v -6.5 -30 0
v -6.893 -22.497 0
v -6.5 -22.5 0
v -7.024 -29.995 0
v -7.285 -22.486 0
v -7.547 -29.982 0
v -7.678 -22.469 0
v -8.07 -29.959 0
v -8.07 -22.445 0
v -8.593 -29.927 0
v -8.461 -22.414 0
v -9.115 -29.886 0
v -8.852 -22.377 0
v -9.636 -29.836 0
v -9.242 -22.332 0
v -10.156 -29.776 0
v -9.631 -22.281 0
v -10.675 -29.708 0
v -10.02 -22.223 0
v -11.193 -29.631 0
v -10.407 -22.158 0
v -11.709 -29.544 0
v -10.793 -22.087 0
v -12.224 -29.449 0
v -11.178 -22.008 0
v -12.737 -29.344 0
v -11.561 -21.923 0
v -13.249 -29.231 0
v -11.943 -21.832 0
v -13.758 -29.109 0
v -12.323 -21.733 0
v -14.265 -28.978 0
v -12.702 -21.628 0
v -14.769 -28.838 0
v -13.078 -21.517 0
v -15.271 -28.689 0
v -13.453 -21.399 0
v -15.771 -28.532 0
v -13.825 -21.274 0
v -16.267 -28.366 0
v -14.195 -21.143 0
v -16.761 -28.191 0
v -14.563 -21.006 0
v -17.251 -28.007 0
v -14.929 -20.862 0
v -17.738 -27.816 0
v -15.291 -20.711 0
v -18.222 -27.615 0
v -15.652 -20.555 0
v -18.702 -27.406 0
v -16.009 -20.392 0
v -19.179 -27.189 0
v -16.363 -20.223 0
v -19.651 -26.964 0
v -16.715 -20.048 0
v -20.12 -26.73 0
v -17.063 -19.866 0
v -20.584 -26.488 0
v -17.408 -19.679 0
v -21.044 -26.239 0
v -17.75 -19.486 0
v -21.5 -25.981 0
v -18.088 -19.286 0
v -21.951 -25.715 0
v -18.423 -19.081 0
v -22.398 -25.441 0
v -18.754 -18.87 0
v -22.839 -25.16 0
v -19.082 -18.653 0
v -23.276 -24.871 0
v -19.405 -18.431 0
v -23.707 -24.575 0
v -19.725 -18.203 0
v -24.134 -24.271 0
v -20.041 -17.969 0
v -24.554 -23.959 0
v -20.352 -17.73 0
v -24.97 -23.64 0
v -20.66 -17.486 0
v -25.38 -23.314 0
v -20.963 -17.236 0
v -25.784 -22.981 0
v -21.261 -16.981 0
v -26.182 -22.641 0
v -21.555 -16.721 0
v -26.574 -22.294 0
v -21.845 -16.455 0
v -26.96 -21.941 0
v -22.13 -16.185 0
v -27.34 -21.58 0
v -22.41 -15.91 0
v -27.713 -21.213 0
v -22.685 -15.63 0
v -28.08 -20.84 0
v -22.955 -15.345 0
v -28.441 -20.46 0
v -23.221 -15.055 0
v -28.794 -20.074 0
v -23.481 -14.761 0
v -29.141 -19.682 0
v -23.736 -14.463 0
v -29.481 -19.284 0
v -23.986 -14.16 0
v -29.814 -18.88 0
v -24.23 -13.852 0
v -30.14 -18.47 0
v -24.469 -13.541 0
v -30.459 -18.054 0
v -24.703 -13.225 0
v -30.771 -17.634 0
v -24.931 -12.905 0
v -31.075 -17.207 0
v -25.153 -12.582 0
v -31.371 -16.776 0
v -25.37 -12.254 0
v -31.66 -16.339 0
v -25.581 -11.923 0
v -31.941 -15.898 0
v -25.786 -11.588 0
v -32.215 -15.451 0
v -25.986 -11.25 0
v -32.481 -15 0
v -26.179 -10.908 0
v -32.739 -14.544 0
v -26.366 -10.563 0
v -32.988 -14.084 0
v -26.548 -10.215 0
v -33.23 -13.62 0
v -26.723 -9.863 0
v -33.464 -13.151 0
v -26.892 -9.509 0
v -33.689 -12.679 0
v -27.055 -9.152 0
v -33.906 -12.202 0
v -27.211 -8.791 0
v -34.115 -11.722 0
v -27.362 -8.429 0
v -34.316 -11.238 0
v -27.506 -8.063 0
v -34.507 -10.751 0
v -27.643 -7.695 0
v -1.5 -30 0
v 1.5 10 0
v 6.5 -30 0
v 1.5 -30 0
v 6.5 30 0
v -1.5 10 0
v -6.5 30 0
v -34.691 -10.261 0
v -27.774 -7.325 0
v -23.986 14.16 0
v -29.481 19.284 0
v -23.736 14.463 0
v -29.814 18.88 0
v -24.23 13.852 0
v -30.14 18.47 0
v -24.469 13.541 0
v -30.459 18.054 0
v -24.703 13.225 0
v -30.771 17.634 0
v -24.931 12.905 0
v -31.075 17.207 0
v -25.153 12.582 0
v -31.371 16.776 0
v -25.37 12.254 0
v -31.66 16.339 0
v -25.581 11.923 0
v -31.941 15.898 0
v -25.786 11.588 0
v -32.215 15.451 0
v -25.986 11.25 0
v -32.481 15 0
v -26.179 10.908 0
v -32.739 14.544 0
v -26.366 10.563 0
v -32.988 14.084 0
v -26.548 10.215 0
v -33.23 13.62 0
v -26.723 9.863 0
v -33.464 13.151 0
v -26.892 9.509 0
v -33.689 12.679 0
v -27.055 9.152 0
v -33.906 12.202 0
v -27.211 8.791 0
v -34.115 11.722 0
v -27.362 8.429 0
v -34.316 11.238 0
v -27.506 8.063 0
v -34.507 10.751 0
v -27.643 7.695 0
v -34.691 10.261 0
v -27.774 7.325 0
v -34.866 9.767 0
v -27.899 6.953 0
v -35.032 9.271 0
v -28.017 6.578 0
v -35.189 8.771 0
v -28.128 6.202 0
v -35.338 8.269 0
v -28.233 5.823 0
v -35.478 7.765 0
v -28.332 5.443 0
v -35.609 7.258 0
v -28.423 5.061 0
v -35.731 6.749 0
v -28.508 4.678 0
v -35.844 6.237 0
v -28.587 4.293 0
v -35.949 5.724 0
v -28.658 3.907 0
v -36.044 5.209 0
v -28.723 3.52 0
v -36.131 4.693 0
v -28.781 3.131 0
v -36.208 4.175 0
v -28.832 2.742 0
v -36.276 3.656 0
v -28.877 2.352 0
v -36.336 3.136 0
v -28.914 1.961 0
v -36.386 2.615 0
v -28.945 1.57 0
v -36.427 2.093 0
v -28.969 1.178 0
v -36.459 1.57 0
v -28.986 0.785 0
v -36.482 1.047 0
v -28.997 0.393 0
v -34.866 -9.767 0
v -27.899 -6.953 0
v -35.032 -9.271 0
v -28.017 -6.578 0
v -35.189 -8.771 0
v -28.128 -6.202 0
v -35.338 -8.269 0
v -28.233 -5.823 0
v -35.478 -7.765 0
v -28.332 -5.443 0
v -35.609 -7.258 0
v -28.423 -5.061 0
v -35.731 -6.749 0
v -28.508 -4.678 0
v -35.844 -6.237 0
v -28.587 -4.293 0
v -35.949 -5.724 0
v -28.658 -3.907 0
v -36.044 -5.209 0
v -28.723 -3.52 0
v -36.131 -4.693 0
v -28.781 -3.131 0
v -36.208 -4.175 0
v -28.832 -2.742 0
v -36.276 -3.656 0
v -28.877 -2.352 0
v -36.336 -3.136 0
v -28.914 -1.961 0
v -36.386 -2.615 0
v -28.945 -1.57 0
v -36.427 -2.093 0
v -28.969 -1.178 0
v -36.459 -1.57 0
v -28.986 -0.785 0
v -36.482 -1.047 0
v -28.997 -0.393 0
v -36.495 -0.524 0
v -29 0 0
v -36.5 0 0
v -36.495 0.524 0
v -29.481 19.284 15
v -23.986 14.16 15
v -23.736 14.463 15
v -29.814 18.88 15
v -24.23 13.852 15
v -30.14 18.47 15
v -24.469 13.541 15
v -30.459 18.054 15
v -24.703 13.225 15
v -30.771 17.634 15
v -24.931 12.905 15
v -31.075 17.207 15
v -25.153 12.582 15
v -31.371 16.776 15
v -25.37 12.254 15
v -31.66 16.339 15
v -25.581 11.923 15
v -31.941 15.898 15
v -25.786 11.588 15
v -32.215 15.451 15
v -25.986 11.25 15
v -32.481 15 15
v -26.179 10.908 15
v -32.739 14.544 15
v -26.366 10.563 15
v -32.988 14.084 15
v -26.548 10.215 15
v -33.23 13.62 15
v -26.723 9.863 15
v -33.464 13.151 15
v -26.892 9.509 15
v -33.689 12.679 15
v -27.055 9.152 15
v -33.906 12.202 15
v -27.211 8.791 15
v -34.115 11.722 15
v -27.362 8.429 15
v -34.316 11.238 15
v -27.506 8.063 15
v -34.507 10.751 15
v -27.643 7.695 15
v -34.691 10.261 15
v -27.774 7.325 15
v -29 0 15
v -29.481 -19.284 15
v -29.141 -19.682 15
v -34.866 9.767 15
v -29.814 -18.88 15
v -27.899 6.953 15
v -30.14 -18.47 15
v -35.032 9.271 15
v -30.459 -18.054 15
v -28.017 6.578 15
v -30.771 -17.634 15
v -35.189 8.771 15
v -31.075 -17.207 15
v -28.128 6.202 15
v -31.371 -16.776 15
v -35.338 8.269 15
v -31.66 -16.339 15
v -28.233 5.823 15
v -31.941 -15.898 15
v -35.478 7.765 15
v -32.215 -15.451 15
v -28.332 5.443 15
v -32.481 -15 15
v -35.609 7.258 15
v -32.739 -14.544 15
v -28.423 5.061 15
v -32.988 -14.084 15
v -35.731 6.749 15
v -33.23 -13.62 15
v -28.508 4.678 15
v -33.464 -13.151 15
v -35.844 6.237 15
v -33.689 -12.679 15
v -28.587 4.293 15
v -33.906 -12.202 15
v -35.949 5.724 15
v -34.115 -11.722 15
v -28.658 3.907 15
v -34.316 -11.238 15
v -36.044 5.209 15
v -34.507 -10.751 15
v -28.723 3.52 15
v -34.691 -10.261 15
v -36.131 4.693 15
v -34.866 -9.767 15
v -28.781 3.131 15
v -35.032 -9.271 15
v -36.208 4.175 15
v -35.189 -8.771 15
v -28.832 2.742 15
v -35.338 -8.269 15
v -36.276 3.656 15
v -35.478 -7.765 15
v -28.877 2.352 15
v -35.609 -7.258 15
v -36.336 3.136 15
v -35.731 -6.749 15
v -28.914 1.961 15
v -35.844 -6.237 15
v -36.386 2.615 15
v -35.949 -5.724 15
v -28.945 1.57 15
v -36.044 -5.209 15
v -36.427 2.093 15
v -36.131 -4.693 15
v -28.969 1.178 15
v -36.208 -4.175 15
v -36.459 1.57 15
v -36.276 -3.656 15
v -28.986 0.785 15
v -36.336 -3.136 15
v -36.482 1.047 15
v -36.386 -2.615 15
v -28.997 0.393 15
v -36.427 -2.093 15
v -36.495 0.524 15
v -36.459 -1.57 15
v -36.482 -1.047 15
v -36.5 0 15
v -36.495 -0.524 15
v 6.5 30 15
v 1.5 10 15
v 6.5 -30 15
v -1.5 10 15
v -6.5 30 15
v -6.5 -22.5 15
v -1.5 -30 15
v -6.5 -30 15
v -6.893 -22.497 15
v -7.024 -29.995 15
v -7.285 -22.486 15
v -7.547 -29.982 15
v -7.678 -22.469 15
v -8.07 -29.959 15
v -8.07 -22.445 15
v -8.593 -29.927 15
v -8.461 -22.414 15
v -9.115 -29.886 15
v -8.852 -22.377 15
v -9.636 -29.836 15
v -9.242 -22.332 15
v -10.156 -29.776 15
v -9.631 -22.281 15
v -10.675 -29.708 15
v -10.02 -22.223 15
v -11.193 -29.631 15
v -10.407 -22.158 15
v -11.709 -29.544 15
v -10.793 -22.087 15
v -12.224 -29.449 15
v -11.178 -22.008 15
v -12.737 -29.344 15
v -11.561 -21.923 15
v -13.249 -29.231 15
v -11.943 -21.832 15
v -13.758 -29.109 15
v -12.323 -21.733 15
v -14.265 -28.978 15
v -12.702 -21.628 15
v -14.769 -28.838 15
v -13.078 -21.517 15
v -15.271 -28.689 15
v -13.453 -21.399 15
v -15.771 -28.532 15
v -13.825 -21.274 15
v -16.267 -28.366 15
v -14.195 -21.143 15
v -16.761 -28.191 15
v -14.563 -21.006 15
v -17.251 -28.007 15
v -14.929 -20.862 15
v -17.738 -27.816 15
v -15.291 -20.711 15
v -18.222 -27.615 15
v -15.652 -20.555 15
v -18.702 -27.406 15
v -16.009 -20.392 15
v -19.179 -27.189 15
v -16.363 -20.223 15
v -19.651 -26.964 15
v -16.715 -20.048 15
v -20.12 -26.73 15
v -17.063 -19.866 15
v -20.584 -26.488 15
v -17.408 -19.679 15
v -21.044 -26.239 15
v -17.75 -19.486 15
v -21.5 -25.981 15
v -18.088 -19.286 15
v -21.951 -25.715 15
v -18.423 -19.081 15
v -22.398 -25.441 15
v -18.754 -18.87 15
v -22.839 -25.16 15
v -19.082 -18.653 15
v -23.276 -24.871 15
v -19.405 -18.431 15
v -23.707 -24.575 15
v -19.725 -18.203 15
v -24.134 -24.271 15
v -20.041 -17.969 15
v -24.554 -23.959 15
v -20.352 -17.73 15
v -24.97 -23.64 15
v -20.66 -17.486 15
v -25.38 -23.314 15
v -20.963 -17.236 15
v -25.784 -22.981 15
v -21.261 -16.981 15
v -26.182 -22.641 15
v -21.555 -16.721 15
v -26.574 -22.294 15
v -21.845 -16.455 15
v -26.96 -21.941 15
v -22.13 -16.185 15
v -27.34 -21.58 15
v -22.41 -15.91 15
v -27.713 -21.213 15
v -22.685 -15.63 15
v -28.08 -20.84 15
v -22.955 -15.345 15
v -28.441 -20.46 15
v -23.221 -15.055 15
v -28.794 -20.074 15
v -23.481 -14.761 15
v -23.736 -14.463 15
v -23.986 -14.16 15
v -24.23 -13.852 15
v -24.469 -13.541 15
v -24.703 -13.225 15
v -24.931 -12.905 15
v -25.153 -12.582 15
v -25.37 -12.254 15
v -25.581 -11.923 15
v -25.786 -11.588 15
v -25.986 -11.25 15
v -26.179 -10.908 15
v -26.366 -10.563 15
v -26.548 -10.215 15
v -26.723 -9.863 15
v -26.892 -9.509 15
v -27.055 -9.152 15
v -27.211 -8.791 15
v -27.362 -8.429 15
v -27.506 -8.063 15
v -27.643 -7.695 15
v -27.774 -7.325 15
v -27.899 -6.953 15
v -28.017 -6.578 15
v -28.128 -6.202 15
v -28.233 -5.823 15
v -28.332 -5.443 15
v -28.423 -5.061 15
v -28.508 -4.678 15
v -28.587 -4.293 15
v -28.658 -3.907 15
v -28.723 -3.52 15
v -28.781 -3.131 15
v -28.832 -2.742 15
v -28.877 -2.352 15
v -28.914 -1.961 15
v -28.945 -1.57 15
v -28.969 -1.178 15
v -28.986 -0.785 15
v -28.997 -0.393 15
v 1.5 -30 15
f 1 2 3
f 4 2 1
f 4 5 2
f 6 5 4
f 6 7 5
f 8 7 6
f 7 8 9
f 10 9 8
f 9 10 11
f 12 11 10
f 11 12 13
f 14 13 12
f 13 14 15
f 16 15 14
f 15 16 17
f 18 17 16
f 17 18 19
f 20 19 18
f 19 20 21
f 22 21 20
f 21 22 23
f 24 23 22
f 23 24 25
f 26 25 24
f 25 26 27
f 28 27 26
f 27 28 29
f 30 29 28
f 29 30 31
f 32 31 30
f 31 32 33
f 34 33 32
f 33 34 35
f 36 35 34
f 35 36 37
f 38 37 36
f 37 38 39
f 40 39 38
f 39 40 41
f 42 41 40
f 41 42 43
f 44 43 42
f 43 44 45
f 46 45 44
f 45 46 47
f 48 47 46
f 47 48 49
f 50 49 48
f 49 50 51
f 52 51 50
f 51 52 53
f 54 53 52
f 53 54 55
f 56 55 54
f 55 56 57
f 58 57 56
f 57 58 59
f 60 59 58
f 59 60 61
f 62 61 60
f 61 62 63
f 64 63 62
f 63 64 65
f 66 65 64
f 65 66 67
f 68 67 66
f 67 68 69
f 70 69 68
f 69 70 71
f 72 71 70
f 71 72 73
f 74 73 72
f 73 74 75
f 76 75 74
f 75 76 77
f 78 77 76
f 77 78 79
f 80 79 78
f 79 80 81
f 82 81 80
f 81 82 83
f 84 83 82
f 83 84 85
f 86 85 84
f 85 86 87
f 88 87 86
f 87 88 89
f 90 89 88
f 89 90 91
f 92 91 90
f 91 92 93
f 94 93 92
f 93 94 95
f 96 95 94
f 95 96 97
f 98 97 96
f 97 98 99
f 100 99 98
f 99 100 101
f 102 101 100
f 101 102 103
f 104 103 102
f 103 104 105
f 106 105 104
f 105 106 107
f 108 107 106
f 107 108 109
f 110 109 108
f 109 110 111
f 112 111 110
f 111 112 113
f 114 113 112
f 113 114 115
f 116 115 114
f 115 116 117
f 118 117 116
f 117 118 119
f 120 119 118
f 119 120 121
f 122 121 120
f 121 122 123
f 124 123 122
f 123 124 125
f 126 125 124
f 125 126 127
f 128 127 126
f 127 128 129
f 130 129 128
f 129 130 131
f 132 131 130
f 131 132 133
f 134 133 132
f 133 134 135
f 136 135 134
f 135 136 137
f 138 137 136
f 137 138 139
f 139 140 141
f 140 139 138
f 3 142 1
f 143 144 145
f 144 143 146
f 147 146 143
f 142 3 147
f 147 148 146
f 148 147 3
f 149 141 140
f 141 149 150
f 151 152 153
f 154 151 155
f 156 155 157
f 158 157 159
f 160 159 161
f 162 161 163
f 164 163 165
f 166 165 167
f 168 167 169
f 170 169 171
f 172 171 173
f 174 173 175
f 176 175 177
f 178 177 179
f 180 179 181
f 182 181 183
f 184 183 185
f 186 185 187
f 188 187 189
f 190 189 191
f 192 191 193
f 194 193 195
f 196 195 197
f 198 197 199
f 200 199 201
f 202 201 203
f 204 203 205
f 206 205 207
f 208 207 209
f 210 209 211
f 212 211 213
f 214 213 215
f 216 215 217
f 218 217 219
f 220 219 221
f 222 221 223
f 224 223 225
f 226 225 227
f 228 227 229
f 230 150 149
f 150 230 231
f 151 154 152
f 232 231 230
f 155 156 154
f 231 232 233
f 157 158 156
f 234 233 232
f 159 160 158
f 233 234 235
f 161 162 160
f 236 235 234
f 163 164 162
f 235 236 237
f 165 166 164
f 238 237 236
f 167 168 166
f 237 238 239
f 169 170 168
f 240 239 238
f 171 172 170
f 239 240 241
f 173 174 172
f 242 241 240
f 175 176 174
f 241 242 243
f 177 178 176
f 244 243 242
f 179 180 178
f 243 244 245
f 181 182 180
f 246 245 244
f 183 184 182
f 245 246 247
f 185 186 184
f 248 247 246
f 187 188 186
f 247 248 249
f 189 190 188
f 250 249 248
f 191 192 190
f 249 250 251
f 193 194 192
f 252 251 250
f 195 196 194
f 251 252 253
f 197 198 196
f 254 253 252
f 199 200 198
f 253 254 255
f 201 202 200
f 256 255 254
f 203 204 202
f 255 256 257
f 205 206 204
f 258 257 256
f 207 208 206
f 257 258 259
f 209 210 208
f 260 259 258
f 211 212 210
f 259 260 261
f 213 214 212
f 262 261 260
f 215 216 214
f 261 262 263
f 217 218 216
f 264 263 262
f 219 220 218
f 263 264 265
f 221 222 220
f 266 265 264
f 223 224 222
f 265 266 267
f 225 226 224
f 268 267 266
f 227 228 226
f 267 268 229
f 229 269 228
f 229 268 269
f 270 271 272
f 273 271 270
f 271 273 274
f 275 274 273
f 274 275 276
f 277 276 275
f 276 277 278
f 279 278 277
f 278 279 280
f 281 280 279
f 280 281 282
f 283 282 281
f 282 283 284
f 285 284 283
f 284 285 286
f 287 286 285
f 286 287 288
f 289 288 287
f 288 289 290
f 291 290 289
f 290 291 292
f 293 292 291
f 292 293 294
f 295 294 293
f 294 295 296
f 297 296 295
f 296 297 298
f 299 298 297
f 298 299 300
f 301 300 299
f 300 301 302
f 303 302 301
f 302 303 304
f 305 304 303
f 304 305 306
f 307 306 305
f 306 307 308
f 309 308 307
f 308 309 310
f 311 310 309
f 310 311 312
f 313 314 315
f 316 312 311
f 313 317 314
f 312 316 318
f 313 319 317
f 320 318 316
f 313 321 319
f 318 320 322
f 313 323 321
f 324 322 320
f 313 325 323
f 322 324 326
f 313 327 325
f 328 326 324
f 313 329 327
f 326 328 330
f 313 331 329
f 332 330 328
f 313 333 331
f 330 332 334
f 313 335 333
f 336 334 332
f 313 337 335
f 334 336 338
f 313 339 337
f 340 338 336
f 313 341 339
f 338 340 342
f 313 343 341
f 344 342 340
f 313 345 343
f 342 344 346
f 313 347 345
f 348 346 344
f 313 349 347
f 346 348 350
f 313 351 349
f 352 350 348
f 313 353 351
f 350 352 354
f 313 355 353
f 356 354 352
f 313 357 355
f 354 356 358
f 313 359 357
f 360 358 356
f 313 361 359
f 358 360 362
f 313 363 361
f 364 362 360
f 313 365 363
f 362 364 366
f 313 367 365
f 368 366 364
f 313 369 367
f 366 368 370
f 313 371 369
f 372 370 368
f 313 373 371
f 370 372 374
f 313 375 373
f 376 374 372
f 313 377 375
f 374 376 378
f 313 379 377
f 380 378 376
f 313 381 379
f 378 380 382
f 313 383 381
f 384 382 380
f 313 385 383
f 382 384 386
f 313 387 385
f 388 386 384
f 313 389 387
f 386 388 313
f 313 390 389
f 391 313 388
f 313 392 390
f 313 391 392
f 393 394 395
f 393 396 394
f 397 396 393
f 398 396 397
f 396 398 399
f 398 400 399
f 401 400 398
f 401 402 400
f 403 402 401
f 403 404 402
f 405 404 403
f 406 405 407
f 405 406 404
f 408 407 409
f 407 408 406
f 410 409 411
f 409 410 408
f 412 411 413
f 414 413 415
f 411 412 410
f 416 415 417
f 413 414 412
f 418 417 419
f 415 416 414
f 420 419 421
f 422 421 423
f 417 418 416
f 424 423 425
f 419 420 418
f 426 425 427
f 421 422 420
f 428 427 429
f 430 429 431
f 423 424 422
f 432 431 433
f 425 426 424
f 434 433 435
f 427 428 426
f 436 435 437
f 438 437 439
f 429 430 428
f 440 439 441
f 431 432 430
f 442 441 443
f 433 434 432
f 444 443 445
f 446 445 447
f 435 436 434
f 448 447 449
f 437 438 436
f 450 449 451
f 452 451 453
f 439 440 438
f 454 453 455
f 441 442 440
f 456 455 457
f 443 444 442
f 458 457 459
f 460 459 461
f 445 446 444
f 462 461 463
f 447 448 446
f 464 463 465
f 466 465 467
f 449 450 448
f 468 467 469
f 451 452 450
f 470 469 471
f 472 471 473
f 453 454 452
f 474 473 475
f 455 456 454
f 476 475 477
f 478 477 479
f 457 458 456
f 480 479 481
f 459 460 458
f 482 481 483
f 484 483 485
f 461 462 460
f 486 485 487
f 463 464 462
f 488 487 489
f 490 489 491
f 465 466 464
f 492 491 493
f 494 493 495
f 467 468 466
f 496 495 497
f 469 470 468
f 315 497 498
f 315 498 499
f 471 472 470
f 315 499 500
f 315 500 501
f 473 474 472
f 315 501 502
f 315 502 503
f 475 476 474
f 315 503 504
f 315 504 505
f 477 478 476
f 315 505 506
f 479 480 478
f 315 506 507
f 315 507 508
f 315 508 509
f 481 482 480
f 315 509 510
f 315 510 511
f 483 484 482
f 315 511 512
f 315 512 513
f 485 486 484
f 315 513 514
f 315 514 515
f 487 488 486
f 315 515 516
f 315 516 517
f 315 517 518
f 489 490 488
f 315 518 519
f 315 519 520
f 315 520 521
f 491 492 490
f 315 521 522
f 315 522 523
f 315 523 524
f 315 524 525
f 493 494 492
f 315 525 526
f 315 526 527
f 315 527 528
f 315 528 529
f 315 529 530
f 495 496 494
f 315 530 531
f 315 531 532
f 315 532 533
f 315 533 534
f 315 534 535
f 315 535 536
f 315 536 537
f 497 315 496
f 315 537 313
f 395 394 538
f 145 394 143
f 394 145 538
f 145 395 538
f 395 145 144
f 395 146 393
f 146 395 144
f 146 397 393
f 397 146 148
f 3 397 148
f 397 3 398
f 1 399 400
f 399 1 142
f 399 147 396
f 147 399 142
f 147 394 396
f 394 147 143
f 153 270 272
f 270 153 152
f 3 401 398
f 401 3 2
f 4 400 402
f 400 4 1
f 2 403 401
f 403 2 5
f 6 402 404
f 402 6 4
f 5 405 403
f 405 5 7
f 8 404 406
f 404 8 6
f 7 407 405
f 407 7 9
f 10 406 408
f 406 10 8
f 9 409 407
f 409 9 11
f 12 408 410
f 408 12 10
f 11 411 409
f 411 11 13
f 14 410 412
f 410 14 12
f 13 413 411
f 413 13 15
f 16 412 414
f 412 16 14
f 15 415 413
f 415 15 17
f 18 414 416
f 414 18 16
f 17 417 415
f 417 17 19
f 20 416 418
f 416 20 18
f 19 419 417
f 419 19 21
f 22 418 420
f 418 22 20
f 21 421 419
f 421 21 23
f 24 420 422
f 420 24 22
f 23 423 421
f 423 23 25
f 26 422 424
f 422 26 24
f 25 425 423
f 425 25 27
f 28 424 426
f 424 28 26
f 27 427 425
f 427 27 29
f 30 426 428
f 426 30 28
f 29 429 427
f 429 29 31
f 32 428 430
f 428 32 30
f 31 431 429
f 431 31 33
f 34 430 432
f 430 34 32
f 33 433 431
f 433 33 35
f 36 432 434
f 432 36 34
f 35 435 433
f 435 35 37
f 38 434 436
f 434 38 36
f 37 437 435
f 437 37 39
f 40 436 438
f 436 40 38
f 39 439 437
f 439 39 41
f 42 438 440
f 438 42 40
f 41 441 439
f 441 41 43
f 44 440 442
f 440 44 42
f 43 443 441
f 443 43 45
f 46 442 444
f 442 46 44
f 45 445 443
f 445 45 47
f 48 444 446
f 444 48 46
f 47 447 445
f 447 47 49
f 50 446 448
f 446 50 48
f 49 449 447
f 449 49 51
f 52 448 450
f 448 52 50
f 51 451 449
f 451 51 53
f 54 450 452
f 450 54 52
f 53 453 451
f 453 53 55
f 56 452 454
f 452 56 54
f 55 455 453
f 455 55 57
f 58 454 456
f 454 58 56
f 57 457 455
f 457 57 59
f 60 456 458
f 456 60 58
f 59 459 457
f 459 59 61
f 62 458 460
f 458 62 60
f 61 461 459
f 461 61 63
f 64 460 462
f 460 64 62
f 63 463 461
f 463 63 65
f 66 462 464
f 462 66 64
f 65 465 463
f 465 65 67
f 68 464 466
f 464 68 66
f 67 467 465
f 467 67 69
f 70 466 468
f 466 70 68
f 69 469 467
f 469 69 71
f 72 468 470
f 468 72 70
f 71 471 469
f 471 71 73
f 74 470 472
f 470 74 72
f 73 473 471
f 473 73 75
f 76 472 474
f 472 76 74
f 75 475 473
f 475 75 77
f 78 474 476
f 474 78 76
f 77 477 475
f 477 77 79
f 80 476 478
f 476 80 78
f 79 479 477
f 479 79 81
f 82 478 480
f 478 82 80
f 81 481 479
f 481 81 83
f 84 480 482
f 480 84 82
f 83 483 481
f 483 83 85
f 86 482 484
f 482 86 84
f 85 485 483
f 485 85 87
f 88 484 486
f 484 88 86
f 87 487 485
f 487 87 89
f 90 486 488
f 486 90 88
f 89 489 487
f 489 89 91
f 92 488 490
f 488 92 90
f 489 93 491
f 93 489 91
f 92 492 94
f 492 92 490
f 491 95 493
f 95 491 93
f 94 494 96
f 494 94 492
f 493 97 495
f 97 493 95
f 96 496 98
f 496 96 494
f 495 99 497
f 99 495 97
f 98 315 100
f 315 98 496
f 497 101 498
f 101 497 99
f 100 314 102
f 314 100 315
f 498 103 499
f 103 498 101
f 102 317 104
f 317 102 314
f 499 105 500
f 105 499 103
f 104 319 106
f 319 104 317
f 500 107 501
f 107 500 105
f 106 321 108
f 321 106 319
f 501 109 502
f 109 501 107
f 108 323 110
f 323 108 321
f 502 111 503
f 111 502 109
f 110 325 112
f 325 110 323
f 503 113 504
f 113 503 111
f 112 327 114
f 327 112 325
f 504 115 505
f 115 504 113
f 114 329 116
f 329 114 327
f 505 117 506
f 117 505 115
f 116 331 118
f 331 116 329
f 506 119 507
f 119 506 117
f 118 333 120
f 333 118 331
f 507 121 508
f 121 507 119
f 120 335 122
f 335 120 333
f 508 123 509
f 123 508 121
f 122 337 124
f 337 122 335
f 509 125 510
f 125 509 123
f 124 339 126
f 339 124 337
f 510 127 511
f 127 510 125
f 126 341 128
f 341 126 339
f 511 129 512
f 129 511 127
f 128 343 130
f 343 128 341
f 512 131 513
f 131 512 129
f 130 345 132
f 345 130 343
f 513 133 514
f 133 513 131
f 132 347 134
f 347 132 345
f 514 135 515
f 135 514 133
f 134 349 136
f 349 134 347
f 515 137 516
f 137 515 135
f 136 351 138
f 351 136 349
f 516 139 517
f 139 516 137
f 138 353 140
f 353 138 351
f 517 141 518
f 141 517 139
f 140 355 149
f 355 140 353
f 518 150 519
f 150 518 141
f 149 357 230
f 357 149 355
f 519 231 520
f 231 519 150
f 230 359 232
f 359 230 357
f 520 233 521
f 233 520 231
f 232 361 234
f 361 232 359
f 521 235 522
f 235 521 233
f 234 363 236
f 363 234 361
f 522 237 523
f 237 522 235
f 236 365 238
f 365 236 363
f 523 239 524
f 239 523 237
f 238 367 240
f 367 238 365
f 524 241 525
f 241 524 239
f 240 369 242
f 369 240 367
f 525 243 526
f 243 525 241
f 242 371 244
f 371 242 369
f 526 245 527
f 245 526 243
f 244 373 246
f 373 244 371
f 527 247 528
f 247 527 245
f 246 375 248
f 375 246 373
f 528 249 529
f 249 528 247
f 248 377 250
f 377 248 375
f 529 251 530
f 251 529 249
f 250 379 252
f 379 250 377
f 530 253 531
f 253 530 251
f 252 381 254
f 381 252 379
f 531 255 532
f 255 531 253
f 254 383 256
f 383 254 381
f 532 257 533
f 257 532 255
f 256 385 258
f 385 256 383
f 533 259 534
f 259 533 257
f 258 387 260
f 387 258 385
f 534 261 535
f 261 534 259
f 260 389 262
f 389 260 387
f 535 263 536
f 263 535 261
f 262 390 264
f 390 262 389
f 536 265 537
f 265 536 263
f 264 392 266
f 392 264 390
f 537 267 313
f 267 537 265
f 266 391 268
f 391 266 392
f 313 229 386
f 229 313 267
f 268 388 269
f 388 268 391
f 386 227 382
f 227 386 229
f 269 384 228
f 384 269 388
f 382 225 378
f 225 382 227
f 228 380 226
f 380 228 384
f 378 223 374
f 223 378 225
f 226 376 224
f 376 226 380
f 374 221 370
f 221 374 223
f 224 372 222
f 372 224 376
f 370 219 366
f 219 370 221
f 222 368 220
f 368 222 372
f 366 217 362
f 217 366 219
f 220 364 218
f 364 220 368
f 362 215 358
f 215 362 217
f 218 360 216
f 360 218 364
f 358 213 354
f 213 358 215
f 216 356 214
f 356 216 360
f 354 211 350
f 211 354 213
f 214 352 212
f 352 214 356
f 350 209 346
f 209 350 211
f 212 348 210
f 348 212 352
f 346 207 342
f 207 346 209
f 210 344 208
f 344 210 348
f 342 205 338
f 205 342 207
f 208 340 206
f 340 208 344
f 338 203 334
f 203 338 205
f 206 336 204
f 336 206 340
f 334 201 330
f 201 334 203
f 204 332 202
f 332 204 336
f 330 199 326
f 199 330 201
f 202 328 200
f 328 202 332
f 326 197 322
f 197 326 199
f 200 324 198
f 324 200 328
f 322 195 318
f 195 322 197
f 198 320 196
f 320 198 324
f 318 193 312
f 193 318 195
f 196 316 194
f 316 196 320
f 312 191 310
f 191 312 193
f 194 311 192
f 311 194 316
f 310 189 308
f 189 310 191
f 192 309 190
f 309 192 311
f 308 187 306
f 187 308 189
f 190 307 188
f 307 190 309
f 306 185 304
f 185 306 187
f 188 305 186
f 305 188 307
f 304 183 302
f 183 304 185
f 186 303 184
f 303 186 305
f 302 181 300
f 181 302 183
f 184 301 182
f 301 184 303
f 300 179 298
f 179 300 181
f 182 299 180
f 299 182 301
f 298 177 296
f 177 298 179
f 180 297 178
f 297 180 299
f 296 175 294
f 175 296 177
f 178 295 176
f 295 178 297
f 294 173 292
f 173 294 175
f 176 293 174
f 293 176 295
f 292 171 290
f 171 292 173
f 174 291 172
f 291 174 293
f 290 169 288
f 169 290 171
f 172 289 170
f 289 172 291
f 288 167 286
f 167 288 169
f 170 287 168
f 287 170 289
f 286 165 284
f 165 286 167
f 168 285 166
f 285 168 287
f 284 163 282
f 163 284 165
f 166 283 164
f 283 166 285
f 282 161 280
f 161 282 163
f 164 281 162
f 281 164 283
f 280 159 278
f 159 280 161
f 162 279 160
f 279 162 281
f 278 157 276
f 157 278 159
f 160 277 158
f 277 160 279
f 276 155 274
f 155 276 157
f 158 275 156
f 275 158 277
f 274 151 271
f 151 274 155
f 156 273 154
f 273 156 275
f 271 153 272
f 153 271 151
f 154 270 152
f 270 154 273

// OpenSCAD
$fn = 360;

clipGapWidth = 3;
clipWidthHookSide = 5;
clipWidthPantSide = 5;
clipHeight = 60;
clipTopHeight = 20;
clipLength = 15;
hookHeight = 7.5;
hookAngle = 130;

clipWidth = clipGapWidth + clipWidthHookSide + clipWidthPantSide;

//Clip
linear_extrude(clipLength) 
    difference(){
            square([clipWidth, clipHeight], center = true);
        translate([ (clipWidthHookSide - clipWidthPantSide) / 2, (clipTopHeight) / -2,0])
            square([clipGapWidth, clipHeight - clipTopHeight], center = true);
    }
//Hook
translate([clipWidth / -2, 0, clipLength / 2] )
    rotate(90)
        rotate_extrude(angle = hookAngle * -1)
            translate([((clipHeight - hookHeight)/ -2),0, 0])
                    square([hookHeight, clipLength], center = true);
